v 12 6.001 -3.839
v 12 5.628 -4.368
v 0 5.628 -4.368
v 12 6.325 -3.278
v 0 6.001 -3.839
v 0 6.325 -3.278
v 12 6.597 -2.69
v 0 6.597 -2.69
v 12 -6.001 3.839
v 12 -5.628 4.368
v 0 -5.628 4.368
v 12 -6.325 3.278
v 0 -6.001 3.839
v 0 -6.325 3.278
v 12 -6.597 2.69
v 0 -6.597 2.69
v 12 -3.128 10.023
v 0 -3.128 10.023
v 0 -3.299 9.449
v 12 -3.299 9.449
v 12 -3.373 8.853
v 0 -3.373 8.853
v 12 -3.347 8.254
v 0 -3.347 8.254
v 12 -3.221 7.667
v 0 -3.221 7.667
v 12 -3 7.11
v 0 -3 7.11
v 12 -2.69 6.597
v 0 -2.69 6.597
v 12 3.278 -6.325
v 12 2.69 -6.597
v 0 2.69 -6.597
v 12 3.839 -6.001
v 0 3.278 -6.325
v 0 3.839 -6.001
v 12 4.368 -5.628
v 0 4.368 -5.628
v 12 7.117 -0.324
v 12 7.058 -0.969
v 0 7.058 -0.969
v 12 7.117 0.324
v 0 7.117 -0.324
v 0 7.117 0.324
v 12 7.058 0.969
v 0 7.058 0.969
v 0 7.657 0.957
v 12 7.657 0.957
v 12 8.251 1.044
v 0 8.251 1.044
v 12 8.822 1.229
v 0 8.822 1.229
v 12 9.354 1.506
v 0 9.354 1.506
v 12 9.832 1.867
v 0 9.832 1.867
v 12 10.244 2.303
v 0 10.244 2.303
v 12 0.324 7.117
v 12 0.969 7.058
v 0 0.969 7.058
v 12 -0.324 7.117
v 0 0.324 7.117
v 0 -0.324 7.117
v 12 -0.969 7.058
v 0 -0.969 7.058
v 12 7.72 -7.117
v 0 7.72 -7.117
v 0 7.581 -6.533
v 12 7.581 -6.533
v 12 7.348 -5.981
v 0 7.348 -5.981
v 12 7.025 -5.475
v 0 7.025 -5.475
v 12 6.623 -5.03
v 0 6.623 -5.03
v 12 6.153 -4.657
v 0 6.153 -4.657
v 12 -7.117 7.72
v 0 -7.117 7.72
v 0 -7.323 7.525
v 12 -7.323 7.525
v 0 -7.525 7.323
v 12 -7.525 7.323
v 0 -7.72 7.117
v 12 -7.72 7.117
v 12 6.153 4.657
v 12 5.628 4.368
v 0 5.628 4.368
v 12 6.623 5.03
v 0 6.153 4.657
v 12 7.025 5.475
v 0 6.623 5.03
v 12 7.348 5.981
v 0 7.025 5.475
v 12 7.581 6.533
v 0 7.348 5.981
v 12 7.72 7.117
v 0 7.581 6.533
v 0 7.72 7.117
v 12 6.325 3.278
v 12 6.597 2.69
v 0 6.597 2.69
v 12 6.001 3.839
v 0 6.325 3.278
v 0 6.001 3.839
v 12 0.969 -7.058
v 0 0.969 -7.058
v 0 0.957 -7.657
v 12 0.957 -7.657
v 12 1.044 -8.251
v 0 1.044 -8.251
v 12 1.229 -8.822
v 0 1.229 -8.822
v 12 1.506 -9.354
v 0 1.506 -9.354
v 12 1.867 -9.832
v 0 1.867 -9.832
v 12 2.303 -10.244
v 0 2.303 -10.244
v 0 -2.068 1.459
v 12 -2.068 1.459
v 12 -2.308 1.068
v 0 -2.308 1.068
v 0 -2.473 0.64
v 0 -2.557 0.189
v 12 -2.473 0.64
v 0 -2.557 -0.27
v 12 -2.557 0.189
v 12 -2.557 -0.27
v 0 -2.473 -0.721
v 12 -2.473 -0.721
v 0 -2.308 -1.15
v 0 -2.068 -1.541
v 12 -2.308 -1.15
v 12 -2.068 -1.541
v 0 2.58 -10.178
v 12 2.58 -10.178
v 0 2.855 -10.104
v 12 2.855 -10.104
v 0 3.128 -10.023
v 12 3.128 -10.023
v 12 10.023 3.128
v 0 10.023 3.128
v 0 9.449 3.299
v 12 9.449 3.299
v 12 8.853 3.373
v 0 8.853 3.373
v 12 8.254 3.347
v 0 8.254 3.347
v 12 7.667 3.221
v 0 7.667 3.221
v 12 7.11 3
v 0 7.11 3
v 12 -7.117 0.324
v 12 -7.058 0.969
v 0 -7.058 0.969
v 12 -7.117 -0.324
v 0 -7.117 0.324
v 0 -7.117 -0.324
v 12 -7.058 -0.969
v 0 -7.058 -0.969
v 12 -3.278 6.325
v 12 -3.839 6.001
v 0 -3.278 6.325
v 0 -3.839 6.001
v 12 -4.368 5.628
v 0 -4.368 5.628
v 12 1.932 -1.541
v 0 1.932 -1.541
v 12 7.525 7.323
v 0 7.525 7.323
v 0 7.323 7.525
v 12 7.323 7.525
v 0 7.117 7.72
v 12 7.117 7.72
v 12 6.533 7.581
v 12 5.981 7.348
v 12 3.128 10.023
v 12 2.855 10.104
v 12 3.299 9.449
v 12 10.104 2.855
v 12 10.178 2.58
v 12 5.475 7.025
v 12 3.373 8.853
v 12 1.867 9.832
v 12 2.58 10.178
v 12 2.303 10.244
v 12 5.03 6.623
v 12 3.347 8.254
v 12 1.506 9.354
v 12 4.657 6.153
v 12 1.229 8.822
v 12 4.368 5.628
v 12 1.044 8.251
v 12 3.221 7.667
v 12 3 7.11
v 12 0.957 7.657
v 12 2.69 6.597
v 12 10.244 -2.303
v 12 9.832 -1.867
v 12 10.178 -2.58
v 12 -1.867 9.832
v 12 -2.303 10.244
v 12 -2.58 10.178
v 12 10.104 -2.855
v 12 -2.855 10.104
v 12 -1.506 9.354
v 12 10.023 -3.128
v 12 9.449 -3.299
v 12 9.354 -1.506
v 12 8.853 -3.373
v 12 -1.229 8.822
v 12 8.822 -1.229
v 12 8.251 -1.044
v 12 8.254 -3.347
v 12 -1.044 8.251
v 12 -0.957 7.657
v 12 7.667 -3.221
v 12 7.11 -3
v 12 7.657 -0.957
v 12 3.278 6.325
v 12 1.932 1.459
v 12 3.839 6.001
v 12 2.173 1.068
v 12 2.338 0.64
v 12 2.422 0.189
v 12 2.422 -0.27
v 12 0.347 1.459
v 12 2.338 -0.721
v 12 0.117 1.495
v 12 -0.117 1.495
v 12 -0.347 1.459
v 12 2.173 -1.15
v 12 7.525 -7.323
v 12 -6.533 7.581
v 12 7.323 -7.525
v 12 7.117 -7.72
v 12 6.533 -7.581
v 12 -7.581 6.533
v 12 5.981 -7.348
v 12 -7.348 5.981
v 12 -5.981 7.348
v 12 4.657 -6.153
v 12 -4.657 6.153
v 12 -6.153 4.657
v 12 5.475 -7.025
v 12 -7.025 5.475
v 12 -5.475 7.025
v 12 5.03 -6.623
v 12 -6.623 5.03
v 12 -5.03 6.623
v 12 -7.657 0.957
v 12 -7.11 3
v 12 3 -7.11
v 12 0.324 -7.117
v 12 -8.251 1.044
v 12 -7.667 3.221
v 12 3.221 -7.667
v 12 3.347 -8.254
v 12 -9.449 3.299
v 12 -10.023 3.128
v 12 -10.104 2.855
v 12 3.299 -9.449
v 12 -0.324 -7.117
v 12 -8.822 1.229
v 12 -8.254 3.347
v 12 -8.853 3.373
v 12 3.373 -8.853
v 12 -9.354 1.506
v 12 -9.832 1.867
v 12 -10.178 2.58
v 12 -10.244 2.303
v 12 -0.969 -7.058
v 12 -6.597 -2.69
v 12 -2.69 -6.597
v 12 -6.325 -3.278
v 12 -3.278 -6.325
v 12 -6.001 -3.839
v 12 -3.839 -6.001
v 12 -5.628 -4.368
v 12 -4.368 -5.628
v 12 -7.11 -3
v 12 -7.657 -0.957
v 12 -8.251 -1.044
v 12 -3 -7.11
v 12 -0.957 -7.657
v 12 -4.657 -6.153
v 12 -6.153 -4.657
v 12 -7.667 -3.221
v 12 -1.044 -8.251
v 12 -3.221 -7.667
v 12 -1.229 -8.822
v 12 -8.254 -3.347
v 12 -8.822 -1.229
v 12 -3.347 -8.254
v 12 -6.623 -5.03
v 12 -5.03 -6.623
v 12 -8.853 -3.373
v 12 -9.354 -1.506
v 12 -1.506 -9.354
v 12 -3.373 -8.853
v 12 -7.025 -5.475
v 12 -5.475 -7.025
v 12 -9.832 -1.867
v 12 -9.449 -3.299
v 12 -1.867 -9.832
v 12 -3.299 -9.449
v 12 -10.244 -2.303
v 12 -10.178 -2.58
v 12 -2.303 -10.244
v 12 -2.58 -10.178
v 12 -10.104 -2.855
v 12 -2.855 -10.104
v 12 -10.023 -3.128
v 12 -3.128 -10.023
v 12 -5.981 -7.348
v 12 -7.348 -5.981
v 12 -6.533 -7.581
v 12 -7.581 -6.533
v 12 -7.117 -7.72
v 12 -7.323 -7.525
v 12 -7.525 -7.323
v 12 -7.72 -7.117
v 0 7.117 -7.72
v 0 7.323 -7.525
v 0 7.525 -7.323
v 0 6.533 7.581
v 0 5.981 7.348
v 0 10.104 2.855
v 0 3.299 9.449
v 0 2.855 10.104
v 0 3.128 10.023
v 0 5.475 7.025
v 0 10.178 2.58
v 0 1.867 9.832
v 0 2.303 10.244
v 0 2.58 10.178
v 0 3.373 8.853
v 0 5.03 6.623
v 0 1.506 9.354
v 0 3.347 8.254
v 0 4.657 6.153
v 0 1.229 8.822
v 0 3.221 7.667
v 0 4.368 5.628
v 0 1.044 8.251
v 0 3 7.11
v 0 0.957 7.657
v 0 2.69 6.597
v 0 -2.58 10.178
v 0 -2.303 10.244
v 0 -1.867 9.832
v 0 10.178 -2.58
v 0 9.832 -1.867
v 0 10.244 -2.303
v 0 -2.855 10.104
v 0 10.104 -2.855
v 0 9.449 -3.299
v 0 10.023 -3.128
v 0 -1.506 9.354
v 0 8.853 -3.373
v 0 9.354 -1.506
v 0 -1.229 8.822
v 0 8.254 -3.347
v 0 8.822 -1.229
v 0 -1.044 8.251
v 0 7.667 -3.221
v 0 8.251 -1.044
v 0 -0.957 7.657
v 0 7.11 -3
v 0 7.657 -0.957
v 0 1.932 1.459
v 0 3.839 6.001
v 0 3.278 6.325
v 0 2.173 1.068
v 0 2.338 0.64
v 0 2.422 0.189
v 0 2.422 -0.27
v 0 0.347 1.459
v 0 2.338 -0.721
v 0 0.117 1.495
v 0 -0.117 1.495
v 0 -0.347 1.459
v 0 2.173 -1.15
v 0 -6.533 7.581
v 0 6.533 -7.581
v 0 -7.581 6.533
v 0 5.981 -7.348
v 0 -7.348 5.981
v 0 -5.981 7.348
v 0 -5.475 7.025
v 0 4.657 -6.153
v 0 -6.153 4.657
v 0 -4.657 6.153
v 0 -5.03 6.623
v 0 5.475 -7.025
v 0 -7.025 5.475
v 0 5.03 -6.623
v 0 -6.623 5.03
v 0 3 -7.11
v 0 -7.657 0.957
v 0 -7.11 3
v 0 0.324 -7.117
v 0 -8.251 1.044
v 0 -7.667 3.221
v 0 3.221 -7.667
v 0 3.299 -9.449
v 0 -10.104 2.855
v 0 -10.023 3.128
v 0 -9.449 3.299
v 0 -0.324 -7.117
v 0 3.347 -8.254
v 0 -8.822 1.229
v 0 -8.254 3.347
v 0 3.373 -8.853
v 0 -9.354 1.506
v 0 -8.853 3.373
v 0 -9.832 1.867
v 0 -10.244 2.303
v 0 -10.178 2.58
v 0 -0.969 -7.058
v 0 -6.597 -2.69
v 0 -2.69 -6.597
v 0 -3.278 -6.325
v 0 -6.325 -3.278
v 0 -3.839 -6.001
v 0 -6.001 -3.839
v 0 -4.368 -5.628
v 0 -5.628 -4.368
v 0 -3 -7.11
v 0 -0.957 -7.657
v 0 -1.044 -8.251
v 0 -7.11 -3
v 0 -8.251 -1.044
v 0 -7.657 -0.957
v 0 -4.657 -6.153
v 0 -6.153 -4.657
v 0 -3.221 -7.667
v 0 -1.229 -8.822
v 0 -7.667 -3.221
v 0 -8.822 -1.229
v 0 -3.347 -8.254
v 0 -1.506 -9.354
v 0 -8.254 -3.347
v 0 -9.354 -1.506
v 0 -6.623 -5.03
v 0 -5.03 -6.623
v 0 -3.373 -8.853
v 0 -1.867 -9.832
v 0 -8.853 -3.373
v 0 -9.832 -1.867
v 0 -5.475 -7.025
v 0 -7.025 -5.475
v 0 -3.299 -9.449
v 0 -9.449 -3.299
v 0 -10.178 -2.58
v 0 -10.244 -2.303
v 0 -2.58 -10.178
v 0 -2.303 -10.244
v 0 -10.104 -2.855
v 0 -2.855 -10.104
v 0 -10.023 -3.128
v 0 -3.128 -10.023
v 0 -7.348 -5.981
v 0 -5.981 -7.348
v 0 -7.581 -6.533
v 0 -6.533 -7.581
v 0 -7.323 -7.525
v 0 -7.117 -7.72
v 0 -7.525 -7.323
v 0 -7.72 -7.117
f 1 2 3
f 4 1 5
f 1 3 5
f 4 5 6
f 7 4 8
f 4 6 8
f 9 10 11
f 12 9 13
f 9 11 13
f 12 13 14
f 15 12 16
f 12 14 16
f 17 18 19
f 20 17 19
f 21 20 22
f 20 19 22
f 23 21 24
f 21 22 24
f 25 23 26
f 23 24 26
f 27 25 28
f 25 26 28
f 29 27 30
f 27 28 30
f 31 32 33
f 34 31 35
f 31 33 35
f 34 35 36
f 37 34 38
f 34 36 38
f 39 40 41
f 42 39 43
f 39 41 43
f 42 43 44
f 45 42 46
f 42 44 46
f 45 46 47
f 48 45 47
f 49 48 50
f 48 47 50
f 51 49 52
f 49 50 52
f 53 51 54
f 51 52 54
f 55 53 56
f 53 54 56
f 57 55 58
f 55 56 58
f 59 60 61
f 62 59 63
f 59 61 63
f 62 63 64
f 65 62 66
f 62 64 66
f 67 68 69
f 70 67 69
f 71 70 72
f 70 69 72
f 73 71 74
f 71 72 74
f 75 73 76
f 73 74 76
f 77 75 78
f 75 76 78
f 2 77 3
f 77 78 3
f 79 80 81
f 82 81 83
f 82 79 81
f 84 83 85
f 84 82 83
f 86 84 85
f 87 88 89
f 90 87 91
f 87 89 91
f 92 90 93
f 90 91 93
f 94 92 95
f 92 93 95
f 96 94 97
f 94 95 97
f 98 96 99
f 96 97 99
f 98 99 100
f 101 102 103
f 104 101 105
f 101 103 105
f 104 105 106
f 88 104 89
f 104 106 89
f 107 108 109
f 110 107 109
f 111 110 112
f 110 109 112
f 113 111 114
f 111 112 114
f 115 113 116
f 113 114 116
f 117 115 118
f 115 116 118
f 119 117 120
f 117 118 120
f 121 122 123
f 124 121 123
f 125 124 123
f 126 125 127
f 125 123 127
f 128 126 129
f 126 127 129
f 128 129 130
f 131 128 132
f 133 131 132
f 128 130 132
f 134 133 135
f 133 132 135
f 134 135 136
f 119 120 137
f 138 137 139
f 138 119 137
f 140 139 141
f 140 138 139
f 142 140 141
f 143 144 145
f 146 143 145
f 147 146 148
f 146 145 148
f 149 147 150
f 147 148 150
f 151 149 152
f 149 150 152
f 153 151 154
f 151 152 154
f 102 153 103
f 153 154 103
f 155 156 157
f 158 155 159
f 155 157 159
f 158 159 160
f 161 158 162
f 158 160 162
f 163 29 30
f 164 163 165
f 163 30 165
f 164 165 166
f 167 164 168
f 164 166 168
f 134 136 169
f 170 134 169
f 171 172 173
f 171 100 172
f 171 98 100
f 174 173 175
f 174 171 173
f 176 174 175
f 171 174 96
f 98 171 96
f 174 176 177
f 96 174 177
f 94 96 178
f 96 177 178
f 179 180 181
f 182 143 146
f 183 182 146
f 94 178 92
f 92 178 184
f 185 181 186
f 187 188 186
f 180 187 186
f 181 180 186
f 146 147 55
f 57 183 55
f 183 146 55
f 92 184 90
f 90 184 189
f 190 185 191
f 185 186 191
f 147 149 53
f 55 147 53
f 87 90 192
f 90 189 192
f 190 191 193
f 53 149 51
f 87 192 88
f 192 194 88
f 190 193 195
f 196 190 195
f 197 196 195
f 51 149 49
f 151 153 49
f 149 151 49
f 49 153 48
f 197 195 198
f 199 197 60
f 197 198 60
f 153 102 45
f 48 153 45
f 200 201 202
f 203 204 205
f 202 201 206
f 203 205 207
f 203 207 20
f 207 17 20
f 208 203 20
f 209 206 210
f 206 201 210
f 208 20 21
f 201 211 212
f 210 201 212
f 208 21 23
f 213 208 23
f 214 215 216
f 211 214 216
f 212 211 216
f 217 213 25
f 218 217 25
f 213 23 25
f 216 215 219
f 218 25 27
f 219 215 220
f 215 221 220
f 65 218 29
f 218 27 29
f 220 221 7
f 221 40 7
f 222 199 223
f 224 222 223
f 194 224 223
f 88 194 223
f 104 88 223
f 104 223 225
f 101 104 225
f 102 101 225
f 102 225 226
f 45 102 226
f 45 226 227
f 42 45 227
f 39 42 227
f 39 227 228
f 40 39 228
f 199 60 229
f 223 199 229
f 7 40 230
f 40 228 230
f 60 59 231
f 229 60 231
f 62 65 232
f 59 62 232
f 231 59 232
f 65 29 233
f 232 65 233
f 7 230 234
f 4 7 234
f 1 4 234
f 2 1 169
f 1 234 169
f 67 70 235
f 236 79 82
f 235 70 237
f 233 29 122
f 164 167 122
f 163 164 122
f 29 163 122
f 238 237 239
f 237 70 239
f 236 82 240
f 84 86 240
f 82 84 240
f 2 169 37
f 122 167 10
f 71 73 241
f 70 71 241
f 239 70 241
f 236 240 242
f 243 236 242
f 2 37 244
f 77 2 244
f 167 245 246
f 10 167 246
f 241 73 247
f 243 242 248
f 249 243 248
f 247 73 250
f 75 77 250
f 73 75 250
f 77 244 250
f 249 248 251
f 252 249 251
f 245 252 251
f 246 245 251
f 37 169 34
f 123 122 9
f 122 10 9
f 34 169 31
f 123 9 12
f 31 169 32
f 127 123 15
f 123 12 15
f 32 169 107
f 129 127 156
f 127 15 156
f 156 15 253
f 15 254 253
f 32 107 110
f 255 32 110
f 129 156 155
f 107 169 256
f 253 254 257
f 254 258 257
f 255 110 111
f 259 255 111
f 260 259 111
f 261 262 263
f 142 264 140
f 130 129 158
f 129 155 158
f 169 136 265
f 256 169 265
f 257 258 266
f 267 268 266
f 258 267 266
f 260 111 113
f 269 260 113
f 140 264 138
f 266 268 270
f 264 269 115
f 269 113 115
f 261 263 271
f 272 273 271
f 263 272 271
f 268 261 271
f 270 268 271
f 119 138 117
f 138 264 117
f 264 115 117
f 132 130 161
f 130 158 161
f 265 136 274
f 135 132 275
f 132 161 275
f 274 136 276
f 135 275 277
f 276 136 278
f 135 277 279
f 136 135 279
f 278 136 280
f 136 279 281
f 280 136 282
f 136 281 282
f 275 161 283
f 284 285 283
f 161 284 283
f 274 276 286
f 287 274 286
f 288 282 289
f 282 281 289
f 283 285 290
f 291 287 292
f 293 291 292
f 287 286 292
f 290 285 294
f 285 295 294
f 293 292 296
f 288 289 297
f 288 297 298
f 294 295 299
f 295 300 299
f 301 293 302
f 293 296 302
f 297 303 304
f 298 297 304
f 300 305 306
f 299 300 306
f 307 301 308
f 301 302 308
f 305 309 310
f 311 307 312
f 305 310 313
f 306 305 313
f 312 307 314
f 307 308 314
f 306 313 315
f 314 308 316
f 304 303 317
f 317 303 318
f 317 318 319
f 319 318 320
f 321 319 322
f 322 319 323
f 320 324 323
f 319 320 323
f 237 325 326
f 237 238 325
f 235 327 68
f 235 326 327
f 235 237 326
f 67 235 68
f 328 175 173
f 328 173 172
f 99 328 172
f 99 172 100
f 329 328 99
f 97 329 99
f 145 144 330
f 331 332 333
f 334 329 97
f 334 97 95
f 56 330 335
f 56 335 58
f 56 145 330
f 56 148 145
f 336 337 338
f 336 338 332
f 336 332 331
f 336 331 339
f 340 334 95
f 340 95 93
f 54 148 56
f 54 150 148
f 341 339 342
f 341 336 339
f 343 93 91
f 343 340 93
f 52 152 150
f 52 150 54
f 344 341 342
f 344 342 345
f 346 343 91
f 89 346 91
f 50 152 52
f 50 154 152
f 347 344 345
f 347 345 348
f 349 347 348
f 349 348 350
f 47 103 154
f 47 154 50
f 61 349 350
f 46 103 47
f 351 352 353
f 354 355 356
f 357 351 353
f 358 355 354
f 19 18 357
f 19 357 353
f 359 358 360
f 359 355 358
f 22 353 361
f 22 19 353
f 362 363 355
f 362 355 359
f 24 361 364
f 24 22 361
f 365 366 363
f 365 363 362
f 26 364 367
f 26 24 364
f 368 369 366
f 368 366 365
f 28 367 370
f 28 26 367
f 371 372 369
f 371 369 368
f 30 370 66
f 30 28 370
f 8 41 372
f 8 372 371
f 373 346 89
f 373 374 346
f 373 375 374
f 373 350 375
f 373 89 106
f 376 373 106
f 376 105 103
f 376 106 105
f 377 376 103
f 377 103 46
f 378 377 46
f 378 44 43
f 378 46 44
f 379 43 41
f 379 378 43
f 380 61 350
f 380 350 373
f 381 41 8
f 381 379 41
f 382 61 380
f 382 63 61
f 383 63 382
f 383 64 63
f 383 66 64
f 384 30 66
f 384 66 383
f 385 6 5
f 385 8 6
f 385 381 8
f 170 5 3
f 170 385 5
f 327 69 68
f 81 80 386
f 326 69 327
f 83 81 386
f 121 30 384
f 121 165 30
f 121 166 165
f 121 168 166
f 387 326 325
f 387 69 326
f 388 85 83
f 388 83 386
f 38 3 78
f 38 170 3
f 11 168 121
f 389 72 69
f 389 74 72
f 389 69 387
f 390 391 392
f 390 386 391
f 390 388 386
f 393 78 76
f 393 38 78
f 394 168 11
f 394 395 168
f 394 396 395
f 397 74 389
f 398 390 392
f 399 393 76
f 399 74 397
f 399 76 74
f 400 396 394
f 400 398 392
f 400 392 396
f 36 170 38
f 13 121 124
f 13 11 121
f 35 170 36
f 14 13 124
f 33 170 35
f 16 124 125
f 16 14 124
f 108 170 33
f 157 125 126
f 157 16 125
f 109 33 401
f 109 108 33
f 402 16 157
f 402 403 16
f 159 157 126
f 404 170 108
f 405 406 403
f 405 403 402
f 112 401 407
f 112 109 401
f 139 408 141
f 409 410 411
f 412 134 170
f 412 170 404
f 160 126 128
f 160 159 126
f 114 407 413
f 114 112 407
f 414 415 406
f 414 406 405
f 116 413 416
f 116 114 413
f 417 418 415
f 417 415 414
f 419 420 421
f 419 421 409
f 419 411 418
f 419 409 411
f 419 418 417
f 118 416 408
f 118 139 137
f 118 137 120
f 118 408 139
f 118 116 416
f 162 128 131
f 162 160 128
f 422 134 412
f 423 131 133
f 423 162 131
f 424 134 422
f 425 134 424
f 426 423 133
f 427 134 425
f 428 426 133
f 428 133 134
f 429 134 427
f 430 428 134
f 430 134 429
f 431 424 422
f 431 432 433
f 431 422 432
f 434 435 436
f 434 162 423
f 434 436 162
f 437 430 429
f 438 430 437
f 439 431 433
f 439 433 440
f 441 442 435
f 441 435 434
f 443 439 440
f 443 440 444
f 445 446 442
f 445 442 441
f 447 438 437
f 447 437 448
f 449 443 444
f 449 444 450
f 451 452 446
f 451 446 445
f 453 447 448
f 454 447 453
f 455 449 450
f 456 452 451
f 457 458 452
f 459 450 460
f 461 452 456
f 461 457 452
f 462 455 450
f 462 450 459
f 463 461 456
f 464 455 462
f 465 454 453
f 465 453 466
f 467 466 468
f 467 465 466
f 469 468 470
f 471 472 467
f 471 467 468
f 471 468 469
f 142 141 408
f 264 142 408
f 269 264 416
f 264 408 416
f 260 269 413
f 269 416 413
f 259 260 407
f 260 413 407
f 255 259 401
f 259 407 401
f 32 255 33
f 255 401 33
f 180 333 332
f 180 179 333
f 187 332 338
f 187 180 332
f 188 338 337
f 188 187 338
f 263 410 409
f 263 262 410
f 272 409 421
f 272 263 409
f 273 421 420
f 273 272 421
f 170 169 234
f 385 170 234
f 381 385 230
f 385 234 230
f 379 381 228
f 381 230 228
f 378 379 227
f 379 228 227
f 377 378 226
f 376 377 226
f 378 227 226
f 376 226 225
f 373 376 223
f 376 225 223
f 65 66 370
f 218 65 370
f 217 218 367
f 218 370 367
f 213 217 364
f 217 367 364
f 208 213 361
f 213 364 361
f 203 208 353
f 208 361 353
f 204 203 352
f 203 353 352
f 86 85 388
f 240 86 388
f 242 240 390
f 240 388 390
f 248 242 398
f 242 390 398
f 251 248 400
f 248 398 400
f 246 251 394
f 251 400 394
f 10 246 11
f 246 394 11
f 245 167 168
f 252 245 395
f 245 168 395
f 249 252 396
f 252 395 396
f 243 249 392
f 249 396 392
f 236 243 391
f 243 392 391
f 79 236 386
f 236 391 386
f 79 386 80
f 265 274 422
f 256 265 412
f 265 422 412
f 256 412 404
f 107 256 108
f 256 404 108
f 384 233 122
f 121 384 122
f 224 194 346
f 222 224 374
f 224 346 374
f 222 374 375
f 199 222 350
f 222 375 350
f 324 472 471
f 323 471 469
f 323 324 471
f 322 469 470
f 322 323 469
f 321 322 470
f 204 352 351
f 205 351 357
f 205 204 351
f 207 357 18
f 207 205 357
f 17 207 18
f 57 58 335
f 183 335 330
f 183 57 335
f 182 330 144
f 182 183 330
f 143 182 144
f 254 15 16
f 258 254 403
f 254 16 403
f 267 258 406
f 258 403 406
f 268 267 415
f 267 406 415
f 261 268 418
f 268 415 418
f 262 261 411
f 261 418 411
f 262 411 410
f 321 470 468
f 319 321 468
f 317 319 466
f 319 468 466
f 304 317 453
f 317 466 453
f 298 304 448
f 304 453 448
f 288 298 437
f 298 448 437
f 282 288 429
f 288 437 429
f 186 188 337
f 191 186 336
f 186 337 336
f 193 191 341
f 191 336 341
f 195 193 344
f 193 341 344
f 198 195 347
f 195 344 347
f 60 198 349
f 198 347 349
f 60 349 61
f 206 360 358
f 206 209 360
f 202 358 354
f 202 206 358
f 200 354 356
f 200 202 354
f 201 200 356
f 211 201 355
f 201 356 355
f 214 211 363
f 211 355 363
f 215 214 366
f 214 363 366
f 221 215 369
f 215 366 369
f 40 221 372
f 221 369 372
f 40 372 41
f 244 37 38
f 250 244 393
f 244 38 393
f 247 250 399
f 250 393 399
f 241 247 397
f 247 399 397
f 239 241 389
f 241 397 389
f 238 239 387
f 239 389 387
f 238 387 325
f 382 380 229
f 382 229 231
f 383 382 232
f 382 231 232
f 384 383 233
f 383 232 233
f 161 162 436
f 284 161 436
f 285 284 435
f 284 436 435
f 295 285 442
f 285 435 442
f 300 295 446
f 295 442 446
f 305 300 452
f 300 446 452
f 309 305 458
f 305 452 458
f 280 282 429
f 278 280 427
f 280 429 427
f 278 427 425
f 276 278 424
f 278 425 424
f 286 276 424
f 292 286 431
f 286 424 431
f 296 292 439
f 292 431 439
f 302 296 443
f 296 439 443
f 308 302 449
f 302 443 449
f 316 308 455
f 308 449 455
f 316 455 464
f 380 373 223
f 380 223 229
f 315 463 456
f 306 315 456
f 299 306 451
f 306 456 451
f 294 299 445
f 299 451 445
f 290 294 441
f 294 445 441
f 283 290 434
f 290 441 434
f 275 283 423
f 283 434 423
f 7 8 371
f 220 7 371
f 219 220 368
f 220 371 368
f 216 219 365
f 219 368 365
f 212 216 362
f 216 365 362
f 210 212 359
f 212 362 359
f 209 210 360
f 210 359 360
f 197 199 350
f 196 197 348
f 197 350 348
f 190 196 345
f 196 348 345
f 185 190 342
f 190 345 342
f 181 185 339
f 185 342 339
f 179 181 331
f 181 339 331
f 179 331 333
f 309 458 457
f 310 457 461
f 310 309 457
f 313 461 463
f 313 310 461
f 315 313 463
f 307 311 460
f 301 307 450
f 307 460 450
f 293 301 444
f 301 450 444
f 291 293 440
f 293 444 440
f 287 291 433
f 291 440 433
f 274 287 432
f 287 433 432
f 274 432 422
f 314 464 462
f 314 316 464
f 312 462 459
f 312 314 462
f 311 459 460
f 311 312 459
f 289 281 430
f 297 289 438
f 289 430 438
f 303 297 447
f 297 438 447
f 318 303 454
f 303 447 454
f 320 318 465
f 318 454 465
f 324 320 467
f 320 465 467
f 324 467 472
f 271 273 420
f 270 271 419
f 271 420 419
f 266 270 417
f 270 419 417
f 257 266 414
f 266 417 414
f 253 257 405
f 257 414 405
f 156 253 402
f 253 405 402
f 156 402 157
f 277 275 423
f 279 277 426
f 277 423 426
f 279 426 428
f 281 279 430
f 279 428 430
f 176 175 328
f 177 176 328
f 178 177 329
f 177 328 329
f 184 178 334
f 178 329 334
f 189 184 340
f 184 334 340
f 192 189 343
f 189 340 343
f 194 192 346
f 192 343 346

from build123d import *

# Parameters (mm, degrees)
BASPROSKE_W        = 12
BASPROSKE_H        = 10.5
TOOTHCUT_DEPTH     = 20.091883092
TEETHCUTS_COUNT    = 12
TEETHCUTS_ANGLE    = 330
BORSKE_R           = 1.5
BORE_DEPTH         = 50.0000508
CUT_EXTRUDE1_DEPTH = 15


with BuildPart() as part:
    # BasProSke → Base-Revolve (revolve)
    with BuildSketch(Plane(origin=(0, 0, 0), x_dir=(1, 0, 0), z_dir=(0, 1, 0)), mode=Mode.PRIVATE) as base_revolve_sk:
        with Locations((6, 5.25)):
            Rectangle(BASPROSKE_W, BASPROSKE_H)
    revolve(base_revolve_sk.sketch.rotate(Axis((-10, 0, 0), (1, 0, 0)), 180), axis=Axis((-10, 0, 0), (1, 0, 0)))

    # TooCutSke → ToothCut (cut, through all)
    with BuildSketch(Plane(origin=(0, 0, 0), x_dir=(0, 0, -1), z_dir=(1, 0, 0))):
        with BuildLine():
            ThreePointArc((0.968931207, 7.05780053), (0, 7.124), (-0.968931207, 7.05780053))
            ThreePointArc((-0.968931207, 7.05780053), (-1.23511503, 8.836576748), (-2.328591557, 10.264585063))
            ThreePointArc((-2.328591557, 10.264585063), (0, 10.5254), (2.328591557, 10.264585063))
            ThreePointArc((2.328591557, 10.264585063), (1.23511503, 8.836576748), (0.968931207, 7.05780053))
        make_face()
    toothcut = extrude(amount=TOOTHCUT_DEPTH, mode=Mode.SUBTRACT)

    # TeethCuts: ToothCut ×12 about axis
    teethcuts_axis = Axis((-10, 0, 0), (1, 0, 0))
    for i in range(1, TEETHCUTS_COUNT):
        add(toothcut.rotate(teethcuts_axis, i * TEETHCUTS_ANGLE / (TEETHCUTS_COUNT - 1)), mode=Mode.SUBTRACT)

    # BorSke → Bore (cut, symmetric)
    with BuildSketch(Plane(origin=(0, 0, 0), x_dir=(0, 0, -1), z_dir=(1, 0, 0))):
        with Locations(Location((0, 0, 0), (0, 0, 180))):
            Circle(BORSKE_R)
    extrude(amount=BORE_DEPTH, both=True, mode=Mode.SUBTRACT)

    # Sketch1 → Cut-Extrude1 (cut)
    with BuildSketch(Plane(origin=(12, 0, 0), x_dir=(0, 0, -1), z_dir=(1, 0, 0))):
        with BuildLine():
            Line((1.540634556, -2.067724259), (1.540634556, 1.932275741))
            ThreePointArc((1.540634556, 1.932275741), (0.040634556, 2.432275741), (-1.459365444, 1.932275741))
            Line((-1.459365444, 1.932275741), (-1.459365444, -2.067724259))
            ThreePointArc((-1.459365444, -2.067724259), (0.040634556, -2.567724259), (1.540634556, -2.067724259))
        make_face()
    extrude(amount=-CUT_EXTRUDE1_DEPTH, mode=Mode.SUBTRACT)


solid = part.part
